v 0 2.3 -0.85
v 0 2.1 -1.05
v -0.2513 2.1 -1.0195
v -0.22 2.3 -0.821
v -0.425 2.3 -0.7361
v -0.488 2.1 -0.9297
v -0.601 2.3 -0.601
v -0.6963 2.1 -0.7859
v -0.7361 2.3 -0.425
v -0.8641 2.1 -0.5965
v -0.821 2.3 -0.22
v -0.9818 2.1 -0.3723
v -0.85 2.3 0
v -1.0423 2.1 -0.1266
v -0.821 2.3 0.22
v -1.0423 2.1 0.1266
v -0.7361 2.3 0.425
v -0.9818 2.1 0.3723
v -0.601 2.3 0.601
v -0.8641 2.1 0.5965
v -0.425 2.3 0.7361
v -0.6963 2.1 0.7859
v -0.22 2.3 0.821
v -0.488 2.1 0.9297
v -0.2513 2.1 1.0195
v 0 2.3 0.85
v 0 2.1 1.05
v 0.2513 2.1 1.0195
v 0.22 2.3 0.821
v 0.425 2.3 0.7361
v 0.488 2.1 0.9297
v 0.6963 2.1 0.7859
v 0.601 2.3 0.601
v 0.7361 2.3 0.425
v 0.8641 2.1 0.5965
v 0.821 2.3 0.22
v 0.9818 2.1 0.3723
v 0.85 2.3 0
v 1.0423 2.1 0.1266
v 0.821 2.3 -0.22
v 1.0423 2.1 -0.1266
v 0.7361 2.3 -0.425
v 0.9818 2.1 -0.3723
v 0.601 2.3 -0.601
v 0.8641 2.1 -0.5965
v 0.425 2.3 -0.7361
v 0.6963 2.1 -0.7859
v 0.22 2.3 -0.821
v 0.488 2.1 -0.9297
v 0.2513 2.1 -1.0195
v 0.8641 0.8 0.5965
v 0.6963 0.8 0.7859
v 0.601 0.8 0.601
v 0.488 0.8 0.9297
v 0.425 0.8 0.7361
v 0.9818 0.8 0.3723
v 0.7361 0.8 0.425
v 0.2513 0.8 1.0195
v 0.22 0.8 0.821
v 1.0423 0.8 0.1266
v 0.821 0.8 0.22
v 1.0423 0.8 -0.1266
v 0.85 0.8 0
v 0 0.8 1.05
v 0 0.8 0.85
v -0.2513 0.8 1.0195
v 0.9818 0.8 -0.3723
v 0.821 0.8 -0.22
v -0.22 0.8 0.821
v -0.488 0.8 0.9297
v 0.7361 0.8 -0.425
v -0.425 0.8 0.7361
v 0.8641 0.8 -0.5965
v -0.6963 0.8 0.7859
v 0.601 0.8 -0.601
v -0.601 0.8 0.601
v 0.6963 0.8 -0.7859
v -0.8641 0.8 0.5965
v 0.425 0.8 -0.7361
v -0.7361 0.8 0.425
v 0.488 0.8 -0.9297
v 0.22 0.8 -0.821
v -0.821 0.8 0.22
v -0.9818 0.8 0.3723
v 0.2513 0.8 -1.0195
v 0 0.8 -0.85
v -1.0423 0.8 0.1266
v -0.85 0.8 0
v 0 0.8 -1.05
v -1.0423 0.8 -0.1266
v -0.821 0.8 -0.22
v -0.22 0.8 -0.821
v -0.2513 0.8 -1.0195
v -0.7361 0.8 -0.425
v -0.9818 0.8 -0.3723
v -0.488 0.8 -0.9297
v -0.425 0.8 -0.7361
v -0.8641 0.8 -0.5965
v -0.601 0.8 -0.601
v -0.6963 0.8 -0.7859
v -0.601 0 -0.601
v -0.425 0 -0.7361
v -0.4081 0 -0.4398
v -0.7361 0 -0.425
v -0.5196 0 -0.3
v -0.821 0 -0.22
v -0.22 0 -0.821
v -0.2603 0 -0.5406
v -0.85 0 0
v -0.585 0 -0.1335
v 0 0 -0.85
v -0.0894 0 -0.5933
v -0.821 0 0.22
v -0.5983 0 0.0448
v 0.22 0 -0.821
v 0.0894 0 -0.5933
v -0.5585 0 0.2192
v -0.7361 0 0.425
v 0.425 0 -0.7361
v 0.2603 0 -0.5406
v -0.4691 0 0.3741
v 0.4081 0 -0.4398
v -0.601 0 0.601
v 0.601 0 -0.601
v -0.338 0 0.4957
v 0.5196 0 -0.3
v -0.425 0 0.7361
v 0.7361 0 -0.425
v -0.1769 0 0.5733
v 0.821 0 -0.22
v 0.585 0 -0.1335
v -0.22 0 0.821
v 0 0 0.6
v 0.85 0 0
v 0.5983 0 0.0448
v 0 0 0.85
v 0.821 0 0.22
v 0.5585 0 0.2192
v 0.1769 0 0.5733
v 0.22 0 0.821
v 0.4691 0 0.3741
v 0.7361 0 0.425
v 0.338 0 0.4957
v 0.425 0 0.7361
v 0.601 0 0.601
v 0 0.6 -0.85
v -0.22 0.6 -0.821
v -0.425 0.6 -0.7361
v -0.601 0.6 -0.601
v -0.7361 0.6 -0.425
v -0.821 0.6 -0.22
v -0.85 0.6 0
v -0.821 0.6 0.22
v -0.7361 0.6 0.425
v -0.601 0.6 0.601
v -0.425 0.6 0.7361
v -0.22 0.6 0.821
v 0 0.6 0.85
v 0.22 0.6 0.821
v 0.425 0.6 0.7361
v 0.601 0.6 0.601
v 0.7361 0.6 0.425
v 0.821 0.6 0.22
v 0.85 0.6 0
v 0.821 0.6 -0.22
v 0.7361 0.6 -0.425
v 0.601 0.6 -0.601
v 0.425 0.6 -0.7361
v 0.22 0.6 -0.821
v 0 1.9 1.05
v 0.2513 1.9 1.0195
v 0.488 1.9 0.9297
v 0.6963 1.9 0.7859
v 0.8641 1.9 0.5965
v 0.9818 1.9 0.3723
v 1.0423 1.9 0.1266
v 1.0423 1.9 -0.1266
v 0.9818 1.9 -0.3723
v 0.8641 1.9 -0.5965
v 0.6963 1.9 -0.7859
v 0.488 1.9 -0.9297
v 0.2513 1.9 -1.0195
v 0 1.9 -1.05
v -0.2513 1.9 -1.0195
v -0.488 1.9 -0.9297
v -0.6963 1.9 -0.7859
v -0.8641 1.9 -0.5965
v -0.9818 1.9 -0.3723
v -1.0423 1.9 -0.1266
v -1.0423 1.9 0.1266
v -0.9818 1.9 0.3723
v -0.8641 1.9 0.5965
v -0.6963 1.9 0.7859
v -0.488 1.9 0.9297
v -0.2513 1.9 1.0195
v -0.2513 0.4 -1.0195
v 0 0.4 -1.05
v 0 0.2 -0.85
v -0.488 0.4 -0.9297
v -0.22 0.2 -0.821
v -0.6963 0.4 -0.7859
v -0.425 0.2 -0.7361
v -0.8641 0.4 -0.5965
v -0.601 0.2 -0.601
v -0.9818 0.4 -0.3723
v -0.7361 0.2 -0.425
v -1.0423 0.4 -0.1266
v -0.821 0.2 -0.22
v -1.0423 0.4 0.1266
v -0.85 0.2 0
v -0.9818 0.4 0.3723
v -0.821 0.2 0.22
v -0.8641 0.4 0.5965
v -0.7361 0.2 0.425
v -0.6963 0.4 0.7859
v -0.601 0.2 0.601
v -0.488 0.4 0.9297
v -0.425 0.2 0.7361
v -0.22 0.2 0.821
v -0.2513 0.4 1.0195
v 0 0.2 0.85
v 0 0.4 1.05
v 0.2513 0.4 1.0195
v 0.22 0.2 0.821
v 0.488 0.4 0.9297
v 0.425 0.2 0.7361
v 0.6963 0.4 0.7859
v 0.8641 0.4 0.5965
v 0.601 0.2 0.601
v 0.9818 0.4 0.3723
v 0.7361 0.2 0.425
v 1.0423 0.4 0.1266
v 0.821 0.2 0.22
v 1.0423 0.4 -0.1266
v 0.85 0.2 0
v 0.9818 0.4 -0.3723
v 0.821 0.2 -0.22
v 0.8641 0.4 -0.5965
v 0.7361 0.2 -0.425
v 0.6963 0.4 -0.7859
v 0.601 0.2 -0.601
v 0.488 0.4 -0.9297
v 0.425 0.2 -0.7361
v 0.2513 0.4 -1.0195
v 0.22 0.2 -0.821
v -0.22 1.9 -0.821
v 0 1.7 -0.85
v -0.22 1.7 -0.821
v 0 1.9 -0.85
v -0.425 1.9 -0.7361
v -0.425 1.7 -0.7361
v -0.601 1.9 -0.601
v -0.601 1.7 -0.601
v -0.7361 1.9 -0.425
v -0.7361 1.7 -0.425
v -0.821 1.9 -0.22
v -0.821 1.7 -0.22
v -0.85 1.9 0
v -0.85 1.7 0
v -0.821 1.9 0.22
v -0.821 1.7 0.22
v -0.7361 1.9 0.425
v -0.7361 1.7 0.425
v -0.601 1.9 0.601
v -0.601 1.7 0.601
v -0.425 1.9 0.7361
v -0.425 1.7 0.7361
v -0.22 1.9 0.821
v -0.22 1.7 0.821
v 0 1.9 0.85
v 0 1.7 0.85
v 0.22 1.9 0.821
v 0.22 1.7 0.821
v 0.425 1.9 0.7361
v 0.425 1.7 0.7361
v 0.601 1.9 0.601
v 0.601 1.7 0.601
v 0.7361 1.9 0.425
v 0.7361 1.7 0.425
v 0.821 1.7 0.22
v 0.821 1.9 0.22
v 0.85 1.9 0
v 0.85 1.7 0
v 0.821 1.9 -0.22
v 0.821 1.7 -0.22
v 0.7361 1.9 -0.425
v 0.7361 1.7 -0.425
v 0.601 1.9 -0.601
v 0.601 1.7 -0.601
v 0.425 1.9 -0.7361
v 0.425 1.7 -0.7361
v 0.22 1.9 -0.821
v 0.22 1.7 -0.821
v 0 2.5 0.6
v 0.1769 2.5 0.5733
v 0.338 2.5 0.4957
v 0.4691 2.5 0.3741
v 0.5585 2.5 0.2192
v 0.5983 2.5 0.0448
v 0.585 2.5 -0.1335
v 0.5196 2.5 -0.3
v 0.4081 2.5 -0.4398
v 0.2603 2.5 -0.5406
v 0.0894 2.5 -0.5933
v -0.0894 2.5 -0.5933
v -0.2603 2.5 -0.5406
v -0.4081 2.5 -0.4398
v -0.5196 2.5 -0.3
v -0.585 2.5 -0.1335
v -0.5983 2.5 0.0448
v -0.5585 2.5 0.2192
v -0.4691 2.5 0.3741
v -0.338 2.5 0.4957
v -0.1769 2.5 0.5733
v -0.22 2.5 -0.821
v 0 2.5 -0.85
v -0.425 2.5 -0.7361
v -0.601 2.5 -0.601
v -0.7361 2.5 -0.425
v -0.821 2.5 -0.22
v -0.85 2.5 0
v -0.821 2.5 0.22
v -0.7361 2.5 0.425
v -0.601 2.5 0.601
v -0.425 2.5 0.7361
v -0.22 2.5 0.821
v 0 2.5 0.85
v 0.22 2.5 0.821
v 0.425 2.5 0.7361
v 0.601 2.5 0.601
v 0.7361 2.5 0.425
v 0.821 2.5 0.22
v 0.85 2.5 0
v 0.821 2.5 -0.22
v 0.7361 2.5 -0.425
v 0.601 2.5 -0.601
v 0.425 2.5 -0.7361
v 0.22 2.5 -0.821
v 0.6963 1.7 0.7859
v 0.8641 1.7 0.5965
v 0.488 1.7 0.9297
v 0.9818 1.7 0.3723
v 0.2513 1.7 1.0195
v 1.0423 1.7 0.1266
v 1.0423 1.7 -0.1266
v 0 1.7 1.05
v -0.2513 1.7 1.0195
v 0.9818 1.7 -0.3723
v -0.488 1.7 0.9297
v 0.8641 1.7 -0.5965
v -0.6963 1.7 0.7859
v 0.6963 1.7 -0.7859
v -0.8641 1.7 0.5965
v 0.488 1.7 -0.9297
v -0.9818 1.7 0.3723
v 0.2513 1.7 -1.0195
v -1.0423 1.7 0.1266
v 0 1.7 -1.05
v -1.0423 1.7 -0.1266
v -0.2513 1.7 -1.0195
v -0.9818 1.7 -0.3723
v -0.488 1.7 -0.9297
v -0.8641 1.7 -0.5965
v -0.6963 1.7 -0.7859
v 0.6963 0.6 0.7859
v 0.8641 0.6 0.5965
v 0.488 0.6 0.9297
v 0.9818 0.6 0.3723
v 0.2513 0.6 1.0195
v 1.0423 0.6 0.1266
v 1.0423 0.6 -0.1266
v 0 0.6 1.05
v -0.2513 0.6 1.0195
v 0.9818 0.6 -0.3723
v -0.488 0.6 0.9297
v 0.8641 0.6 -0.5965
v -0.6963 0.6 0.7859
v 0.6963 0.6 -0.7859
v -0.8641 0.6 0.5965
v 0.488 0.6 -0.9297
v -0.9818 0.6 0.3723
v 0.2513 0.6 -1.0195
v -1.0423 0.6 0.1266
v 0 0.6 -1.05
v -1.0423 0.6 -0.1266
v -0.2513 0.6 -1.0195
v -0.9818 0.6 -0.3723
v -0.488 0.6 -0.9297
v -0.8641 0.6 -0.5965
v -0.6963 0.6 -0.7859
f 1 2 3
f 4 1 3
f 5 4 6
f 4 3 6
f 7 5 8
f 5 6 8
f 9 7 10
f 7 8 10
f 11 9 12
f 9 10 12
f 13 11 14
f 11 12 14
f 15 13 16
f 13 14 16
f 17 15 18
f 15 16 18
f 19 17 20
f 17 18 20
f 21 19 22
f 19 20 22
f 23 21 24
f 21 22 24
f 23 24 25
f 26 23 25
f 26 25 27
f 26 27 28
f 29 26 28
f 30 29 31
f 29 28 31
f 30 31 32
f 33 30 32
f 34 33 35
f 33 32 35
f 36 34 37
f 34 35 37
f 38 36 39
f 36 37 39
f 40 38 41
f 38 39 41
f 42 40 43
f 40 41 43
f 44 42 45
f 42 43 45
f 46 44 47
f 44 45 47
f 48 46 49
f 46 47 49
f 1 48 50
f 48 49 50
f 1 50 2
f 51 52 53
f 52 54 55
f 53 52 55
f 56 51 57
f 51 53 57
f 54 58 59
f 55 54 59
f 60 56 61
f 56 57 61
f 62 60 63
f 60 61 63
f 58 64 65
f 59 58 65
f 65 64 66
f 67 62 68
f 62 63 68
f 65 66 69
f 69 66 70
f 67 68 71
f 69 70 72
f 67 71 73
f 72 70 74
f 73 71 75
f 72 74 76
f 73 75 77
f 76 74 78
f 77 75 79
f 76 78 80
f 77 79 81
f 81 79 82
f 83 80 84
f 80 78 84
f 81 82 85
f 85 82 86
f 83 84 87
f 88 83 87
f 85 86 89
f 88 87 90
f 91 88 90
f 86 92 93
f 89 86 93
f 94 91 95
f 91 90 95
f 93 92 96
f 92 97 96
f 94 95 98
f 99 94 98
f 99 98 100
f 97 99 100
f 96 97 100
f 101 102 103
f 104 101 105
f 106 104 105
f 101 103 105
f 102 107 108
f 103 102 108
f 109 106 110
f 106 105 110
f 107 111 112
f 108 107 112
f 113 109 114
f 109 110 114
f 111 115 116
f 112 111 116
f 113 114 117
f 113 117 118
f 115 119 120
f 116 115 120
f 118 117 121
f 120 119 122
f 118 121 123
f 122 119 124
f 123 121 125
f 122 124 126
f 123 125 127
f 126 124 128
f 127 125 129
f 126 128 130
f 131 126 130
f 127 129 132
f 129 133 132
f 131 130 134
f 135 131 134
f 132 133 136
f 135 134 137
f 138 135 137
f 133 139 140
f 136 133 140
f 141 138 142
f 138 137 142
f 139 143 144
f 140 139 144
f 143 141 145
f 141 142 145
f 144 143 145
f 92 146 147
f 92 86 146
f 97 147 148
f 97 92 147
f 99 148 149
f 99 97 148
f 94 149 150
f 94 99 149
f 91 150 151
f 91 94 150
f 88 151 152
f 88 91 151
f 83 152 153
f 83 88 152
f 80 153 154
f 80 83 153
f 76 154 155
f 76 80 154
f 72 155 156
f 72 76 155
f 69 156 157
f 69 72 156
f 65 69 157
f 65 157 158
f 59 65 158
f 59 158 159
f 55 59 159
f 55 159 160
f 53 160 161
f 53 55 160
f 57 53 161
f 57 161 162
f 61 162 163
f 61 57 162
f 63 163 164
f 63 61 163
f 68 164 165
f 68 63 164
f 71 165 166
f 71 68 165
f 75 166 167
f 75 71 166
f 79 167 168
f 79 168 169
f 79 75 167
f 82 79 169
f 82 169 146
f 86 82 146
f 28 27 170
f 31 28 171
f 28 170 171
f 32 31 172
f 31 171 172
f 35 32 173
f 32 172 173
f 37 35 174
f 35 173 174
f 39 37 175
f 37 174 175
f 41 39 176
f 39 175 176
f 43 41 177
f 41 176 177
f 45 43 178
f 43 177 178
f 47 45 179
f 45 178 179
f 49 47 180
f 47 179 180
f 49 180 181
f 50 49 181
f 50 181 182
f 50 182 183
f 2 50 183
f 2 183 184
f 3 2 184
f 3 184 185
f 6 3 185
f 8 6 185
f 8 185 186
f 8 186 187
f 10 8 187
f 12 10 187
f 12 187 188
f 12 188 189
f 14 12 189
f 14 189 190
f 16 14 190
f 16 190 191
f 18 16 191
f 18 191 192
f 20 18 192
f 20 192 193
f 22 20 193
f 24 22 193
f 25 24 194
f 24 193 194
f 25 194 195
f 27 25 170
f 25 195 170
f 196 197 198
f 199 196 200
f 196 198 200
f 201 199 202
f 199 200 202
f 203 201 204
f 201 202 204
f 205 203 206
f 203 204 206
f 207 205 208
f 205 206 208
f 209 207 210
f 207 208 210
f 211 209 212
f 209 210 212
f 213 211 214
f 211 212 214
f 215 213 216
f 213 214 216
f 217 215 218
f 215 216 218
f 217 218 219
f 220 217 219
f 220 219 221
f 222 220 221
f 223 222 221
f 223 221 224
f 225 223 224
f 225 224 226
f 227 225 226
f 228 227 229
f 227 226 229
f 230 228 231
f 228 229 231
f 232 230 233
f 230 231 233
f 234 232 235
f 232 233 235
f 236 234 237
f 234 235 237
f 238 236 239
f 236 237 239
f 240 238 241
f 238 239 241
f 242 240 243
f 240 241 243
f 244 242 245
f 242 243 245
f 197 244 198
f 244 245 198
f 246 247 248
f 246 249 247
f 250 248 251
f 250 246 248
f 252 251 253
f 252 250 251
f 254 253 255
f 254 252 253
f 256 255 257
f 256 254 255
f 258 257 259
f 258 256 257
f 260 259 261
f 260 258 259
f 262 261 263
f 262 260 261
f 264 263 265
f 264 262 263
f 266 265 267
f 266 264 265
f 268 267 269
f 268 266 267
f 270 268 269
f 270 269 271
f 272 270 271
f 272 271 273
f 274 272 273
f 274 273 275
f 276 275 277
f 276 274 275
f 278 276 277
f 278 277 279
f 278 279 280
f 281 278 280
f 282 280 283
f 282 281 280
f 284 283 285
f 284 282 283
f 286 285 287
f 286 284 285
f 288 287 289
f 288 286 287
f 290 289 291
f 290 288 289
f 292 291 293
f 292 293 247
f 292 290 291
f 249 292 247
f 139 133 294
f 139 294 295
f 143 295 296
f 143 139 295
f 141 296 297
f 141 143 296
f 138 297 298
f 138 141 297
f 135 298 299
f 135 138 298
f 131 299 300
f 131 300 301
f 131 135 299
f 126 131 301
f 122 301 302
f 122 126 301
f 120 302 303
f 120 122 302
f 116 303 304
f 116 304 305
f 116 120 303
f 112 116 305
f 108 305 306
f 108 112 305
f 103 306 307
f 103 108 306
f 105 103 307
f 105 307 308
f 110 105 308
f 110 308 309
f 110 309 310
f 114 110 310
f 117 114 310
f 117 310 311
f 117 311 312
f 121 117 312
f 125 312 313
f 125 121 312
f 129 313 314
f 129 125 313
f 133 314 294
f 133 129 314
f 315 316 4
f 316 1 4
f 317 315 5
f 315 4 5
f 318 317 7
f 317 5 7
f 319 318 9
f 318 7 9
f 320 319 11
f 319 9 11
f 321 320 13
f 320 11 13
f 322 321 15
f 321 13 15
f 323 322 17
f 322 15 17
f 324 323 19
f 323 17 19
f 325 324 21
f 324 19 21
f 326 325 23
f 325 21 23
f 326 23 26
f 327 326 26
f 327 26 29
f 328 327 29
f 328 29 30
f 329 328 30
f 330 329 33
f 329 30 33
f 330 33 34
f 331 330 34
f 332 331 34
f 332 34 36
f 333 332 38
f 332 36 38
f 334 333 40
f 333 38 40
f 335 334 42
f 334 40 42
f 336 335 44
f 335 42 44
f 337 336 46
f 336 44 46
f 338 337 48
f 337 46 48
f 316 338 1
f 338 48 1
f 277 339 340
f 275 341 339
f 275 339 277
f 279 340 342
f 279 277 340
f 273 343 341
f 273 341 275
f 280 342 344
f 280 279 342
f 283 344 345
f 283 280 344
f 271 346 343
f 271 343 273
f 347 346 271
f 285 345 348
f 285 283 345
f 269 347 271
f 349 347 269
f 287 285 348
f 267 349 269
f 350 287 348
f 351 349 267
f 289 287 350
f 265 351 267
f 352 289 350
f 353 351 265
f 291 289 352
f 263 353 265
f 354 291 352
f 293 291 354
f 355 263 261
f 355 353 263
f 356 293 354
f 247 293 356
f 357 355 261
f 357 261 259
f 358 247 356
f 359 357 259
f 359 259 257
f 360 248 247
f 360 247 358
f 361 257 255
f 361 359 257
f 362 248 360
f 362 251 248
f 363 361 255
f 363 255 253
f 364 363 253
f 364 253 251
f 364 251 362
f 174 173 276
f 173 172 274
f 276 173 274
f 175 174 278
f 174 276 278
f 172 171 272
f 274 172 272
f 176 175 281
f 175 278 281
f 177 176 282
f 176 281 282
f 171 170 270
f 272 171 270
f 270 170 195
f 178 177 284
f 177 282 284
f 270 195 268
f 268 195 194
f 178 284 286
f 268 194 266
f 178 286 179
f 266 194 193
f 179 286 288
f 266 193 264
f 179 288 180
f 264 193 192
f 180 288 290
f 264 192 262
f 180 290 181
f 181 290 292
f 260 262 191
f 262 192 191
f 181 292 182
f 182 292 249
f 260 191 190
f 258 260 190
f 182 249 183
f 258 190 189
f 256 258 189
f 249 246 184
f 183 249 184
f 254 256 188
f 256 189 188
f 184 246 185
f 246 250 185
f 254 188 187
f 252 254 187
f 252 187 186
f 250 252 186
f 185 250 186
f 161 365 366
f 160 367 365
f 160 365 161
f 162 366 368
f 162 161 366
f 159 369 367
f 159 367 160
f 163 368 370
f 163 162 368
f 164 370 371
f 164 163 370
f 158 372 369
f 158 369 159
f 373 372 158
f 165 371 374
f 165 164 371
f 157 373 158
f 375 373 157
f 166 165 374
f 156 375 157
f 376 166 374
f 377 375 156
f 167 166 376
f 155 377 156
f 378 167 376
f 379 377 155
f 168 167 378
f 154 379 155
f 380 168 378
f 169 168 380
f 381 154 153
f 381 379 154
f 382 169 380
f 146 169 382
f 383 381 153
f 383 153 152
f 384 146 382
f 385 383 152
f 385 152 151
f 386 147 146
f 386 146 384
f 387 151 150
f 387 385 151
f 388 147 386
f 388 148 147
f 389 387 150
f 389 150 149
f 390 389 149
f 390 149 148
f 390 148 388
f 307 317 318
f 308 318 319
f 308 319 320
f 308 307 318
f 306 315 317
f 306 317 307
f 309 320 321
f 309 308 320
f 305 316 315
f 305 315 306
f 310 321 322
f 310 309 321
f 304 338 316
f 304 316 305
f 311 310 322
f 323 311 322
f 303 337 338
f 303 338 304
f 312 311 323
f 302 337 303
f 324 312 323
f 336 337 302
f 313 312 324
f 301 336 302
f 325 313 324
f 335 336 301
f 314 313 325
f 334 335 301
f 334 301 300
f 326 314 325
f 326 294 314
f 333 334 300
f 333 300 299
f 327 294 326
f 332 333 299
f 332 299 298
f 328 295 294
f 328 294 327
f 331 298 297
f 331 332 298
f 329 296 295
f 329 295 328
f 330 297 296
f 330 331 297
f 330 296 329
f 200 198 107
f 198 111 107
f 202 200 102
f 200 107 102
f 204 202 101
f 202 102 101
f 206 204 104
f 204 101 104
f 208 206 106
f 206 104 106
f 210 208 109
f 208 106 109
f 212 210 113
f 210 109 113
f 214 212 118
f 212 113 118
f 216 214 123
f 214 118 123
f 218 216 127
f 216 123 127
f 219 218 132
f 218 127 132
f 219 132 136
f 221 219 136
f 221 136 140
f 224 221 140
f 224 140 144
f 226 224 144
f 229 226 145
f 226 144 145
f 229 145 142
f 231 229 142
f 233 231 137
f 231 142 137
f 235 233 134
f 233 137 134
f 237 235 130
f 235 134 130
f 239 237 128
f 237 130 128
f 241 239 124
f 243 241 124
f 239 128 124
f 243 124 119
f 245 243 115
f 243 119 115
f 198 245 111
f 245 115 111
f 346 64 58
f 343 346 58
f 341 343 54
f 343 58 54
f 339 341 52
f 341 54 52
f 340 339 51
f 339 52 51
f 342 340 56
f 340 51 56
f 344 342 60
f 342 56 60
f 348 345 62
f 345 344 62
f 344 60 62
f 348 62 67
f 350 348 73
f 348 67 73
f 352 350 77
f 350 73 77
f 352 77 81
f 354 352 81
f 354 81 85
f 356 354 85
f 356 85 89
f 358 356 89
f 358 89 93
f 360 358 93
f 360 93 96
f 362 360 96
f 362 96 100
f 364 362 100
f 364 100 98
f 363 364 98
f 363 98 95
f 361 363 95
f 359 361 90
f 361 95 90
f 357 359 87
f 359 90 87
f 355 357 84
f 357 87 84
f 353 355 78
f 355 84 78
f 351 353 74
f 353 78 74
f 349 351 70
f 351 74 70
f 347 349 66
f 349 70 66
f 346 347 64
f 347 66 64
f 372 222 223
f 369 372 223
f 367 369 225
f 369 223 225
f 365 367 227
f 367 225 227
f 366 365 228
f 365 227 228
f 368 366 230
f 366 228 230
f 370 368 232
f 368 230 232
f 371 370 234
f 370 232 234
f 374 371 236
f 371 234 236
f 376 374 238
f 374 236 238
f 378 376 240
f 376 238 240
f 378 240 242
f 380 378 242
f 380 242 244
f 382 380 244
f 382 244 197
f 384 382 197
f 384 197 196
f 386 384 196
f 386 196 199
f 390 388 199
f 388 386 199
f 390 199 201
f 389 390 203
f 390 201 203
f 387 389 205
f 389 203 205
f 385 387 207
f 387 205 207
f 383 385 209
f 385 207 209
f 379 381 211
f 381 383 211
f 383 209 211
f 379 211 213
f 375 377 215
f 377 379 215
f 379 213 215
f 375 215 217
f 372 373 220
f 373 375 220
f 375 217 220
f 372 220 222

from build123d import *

# Parameters (mm, degrees)
SKETCH1_R           = 1.05
SKETCH1_R_2         = 0.6
BOSS_EXTRUDE1_DEPTH = 2.5
SKETCH2_W           = 0.2
SKETCH2_H           = 0.2


with BuildPart() as part:
    # Sketch1 → Boss-Extrude1 (new body)
    with BuildSketch(Plane(origin=(0, 0, 0), x_dir=(1, 0, 0), z_dir=(0, 1, 0))):
        with Locations(Location((0, 0, 0), (0, 0, 270))):
            Circle(SKETCH1_R)
        with Locations(Location((0, 0, 0), (0, 0, 270))):
            Circle(SKETCH1_R_2, mode=Mode.SUBTRACT)
    extrude(amount=BOSS_EXTRUDE1_DEPTH)

    # Sketch2 → Cut-Revolve1 (revolve, cut)
    with BuildSketch(Plane(origin=(0, 0, 0), x_dir=(0, 0, -1), z_dir=(1, 0, 0)), mode=Mode.PRIVATE) as cut_revolve1_sk:
        with Locations((-0.95, 1.8)):
            Rectangle(SKETCH2_W, SKETCH2_H)
        Polygon((-1.05, 2.5), (-0.85, 2.5), (-0.85, 2.3), (-1.05, 2.1), align=None)
        with Locations((-0.95, 0.7)):
            Rectangle(SKETCH2_W, SKETCH2_H)
        Polygon((-1.05, 0.4), (-0.85, 0.2), (-0.85, 0), (-1.05, 0), align=None)
    revolve(cut_revolve1_sk.sketch.rotate(Axis((0, 0, 0), (0, 1, 0)), 180), axis=Axis((0, 0, 0), (0, 1, 0)), mode=Mode.SUBTRACT)


solid = part.part
